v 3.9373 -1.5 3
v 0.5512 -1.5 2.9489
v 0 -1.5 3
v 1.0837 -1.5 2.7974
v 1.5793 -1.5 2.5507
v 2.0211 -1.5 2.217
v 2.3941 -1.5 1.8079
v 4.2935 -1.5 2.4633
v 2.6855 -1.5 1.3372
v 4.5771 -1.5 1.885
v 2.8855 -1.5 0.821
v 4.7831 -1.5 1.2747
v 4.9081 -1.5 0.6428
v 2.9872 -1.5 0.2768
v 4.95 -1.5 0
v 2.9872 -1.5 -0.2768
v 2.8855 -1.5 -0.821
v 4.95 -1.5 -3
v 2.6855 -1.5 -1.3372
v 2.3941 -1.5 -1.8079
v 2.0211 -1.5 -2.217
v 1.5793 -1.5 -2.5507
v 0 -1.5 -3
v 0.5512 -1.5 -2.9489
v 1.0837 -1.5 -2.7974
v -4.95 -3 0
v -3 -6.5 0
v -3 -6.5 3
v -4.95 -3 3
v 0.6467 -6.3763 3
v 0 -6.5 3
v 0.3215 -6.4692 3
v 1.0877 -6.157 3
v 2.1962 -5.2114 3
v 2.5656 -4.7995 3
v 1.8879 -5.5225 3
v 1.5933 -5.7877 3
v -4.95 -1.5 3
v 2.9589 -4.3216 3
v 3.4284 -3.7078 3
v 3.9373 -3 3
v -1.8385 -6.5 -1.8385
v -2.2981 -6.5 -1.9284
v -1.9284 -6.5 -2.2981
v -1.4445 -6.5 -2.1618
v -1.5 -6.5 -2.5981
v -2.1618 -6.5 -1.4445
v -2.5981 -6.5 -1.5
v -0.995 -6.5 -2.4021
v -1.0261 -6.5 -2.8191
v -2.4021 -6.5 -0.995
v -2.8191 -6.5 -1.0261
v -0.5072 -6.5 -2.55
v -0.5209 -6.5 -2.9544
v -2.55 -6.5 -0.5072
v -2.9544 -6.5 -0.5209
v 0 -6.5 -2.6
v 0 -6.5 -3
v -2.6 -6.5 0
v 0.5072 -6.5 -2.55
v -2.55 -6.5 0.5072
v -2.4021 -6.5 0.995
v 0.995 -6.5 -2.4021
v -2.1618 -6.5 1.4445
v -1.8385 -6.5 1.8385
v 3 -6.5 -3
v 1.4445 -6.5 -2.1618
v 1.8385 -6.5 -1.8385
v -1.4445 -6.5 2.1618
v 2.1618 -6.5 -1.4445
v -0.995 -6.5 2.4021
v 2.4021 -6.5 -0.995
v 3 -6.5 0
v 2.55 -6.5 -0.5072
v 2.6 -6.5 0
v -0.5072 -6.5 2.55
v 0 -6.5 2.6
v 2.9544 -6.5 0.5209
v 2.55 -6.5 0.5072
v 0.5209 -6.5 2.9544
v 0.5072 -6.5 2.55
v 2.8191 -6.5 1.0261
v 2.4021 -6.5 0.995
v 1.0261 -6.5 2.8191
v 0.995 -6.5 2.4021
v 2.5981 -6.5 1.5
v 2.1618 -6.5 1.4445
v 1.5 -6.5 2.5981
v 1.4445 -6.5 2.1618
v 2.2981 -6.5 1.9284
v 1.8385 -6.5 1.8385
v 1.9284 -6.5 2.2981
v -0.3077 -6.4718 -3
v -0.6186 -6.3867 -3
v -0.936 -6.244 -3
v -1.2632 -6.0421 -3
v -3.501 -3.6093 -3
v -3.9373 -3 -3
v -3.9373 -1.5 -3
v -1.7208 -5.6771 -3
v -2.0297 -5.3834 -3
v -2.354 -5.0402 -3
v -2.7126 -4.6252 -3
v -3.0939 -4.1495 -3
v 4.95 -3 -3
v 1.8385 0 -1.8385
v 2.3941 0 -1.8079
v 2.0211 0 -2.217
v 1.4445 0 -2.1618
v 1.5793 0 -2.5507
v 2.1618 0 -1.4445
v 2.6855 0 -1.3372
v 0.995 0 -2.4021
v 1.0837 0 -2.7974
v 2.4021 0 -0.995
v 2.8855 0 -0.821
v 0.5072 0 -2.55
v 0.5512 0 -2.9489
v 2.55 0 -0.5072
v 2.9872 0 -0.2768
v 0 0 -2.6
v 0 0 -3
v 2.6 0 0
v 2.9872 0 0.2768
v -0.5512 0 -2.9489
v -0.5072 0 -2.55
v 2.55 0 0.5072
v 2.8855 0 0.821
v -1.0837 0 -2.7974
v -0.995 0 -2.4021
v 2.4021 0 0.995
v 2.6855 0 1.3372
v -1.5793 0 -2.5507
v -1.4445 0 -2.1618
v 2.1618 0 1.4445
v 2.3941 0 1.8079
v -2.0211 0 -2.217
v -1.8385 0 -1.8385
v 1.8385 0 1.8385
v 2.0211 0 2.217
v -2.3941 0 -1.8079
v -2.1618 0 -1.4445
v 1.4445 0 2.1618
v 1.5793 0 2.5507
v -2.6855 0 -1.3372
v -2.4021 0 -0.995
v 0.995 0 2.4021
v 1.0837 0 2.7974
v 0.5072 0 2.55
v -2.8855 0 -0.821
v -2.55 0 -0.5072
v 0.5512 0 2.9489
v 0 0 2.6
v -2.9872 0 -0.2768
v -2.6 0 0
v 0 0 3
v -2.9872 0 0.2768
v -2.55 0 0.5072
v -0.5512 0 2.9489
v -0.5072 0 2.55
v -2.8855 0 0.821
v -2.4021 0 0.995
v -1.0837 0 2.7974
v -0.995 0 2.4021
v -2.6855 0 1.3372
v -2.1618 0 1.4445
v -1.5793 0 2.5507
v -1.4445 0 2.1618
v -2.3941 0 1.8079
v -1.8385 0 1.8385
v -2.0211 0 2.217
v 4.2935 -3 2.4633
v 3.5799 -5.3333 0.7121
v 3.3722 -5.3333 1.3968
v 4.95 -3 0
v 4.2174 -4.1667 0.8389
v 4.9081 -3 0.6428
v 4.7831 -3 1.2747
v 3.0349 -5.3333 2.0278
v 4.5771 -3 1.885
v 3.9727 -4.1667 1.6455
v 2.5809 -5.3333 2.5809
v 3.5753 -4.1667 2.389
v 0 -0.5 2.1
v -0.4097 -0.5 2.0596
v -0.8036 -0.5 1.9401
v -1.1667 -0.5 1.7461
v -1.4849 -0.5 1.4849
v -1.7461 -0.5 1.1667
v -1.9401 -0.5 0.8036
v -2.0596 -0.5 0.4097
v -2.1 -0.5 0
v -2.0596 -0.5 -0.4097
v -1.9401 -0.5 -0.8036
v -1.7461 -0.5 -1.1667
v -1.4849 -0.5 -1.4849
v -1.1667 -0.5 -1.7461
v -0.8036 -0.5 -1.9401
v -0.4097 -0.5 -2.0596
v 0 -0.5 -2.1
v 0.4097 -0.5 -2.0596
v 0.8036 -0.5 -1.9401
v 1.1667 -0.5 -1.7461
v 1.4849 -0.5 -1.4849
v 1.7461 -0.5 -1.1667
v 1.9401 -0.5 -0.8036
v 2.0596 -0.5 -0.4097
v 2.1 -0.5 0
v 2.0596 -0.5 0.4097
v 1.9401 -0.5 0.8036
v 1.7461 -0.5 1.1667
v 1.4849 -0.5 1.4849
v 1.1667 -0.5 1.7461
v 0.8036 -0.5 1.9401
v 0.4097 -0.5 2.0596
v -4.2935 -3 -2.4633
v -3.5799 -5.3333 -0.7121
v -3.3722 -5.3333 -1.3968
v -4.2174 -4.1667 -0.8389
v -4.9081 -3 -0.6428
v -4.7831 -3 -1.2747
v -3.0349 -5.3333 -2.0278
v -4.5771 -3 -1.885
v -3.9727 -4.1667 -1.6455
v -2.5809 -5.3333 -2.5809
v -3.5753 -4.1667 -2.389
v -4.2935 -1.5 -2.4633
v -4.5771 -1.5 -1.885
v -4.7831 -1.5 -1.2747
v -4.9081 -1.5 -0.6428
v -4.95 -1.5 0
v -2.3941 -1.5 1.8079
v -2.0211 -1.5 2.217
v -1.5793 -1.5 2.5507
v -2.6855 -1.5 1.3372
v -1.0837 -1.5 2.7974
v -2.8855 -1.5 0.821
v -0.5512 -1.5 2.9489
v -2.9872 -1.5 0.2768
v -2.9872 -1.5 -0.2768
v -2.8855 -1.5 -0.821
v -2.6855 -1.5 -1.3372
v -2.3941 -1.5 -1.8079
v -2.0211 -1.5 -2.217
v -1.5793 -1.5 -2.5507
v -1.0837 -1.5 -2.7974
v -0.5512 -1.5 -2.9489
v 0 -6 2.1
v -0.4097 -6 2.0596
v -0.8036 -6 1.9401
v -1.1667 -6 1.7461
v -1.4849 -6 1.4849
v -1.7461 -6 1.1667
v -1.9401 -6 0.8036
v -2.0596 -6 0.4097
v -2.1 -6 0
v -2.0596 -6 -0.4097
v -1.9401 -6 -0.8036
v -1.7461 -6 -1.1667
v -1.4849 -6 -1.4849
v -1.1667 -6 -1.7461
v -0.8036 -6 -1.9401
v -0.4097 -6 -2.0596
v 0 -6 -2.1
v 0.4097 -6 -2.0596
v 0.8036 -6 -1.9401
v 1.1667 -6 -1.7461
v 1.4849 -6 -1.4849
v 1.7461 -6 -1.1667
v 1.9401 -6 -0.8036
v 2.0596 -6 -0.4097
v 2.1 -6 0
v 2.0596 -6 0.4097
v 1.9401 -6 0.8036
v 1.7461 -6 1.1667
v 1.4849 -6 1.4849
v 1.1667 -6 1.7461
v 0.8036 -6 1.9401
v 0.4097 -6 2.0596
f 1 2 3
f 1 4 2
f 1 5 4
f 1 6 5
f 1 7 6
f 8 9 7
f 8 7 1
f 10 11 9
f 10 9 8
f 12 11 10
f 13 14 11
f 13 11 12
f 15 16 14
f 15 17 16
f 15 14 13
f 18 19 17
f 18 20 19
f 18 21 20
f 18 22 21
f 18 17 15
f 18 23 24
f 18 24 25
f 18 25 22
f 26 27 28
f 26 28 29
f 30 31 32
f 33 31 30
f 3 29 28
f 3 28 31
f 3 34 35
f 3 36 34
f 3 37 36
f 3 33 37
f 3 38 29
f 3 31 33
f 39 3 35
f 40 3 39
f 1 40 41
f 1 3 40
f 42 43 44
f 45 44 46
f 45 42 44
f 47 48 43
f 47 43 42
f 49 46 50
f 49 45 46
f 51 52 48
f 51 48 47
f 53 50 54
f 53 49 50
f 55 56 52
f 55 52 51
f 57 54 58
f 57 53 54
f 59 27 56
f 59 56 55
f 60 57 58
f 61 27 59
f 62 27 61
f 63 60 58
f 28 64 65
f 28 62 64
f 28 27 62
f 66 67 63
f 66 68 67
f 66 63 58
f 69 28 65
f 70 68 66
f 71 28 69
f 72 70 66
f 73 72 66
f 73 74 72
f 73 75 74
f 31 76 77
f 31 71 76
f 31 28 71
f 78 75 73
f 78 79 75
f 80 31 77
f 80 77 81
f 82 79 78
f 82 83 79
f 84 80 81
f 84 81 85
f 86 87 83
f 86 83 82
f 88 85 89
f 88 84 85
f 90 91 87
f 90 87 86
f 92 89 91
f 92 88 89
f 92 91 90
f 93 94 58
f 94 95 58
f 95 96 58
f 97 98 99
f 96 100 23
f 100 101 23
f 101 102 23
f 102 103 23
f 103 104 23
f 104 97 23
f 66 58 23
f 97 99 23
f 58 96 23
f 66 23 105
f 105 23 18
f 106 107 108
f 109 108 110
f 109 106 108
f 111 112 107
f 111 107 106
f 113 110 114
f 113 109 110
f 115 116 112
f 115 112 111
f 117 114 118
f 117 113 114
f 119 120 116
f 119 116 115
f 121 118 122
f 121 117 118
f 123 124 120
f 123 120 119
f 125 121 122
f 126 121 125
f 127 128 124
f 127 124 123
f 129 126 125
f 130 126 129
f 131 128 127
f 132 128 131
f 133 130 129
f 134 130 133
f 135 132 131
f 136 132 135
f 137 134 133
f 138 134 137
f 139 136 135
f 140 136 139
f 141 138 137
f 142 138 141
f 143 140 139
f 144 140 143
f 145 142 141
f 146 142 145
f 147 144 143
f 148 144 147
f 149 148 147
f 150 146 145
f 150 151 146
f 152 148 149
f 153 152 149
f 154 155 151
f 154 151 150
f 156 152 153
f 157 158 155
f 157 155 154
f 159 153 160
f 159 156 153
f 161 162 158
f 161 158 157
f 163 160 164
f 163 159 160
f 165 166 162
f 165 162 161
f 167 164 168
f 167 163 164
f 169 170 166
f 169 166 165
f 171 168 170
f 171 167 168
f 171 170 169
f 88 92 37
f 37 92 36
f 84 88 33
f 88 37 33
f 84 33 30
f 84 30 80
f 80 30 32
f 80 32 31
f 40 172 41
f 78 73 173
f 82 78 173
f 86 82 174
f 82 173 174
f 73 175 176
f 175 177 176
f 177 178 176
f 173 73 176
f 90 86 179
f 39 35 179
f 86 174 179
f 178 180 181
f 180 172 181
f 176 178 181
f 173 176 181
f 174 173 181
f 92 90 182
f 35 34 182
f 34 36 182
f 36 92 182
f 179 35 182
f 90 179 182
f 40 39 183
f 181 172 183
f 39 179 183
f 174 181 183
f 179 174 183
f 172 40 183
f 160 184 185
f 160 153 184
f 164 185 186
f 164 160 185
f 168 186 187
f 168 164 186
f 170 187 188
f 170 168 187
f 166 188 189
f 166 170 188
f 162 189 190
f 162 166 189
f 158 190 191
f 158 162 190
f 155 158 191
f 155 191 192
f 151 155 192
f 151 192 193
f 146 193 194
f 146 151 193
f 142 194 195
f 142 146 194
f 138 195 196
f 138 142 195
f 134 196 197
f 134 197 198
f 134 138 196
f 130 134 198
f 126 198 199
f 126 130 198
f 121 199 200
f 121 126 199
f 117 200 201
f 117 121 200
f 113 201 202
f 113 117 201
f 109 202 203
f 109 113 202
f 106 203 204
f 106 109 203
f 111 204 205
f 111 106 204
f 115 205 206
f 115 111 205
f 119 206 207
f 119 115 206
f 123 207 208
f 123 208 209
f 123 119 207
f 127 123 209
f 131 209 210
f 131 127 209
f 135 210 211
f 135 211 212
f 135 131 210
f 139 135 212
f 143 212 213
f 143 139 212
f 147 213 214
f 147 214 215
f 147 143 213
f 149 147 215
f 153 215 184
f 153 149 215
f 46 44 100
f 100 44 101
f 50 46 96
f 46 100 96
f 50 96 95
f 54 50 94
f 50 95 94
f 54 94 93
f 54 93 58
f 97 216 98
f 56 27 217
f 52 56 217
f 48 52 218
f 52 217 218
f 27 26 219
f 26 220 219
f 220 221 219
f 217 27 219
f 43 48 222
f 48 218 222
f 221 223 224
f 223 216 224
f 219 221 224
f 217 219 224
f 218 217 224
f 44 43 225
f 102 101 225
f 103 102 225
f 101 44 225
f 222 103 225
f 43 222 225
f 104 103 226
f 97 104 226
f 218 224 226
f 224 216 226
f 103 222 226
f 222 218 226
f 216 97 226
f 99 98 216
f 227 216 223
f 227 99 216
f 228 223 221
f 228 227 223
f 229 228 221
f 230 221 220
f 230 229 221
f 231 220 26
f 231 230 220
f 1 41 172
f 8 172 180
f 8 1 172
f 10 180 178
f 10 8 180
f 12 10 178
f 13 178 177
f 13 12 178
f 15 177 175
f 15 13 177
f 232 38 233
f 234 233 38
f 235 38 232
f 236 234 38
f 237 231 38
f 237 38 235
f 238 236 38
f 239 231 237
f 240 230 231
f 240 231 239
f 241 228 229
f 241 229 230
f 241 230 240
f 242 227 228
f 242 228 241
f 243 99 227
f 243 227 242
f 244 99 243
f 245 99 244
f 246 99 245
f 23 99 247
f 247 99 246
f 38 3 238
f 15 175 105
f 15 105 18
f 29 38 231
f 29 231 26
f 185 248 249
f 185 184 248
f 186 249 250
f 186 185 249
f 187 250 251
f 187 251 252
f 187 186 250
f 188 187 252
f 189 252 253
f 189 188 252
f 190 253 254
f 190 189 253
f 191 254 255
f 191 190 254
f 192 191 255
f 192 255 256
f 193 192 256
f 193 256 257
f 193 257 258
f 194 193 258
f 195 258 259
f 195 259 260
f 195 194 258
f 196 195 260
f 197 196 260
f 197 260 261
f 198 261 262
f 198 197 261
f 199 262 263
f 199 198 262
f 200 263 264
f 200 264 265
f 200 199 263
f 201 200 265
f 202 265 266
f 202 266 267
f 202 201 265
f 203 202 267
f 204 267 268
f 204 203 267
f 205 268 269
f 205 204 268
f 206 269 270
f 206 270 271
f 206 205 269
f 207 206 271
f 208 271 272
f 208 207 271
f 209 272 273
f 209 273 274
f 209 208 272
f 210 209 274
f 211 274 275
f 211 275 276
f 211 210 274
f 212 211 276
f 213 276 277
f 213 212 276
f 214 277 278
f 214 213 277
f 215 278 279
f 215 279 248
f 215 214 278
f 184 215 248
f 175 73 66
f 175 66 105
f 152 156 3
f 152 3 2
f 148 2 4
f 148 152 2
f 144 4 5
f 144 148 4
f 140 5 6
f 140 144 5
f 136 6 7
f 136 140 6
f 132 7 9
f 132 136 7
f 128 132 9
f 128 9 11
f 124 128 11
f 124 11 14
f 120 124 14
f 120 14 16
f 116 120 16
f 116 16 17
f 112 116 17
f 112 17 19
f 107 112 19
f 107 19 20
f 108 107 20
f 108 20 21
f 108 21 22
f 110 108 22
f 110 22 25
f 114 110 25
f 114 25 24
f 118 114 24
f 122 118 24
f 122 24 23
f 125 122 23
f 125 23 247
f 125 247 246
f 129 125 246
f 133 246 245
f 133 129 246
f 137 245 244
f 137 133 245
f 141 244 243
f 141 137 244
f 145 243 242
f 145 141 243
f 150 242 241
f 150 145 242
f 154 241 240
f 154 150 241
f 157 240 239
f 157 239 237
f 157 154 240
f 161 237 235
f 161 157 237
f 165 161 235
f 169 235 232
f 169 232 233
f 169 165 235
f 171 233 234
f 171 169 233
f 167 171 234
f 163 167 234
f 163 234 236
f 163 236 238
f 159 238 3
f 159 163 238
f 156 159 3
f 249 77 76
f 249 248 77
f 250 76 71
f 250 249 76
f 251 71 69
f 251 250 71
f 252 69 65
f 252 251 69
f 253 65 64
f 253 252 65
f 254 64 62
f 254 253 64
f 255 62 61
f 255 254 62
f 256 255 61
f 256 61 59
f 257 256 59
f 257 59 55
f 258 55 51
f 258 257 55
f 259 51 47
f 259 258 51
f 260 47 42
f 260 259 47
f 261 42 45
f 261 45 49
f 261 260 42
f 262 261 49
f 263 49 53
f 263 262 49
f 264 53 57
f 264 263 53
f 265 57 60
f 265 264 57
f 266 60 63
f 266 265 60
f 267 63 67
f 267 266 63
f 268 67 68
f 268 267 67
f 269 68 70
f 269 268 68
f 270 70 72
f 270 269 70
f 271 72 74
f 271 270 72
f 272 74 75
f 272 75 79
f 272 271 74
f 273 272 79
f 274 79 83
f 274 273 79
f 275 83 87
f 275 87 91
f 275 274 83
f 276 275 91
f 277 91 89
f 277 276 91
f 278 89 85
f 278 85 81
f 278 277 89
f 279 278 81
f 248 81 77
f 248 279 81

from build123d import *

# Parameters (mm, degrees)
EXTRUDE_1_DEPTH     = 3
SKETCH_4_OUTSIDE_W  = 14.556
SKETCH_4_OUTSIDE_H  = 10.656
SKETCH_4_OUTSIDE_R  = 3
CUT_EXTRUDE_1_DEPTH = 1.5
CUT_EXTRUDE_2_DEPTH = 6


with BuildPart() as part:
    # Эскиз1 → Бобышка-Вытянуть1 (new body, symmetric)
    with BuildSketch(Plane.XY):
        Polygon((3, 0), (-3, 0), (-3, -1.5), (-4.95, -1.5), (-4.95, -6.5), (4.95, -6.5), (4.95, -1.5), (3, -1.5), align=None)
    extrude(amount=EXTRUDE_1_DEPTH, both=True)

    # Эскиз3 → Отверстие обработанное метчиком M51 (revolve, cut)
    with BuildSketch(Plane(origin=(0, 0, 0), x_dir=(0, 0, 1), z_dir=(1, 0, 0))):
        Polygon((0, 0), (0, 6.5), (2.6, 6.5), (2.1, 6), (2.1, 0.5), (2.6, 0), align=None)
    revolve(axis=Axis((0, 6.35, 0), (0, -1, 0)), mode=Mode.SUBTRACT)

    # Эскиз4 outside → Вырез-Вытянуть1 (cut)
    with BuildSketch(Plane(origin=(0, 0, 0), x_dir=(1, 0, 0), z_dir=(0, 1, 0))):
        Rectangle(SKETCH_4_OUTSIDE_W, SKETCH_4_OUTSIDE_H)
        with Locations(Location((0, 0, 0), (0, 0, 270))):  # turned: the seam where the file's is
            Circle(SKETCH_4_OUTSIDE_R, mode=Mode.SUBTRACT)
    extrude(amount=-CUT_EXTRUDE_1_DEPTH, mode=Mode.SUBTRACT)

    # Эскиз5 → Вырез-Вытянуть2 (cut, through all)
    with BuildSketch(Plane(origin=(0, -1.5, 0), x_dir=(1, 0, 0), z_dir=(0, 1, 0))):
        with BuildLine():
            Line((-4.95, 0), (-4.95, 3))
            Line((-4.95, 3), (-3.937321425, 3))
            ThreePointArc((-3.937321425, 3), (-4.690002188, 1.583154912), (-4.95, 0))
        make_face()
        with BuildLine():
            Line((4.95, 0), (4.95, -3))
            Line((4.95, -3), (3.937321425, -3))
            ThreePointArc((3.937321425, -3), (4.690002188, -1.583154912), (4.95, 0))
        make_face()
    extrude(amount=-CUT_EXTRUDE_2_DEPTH, mode=Mode.SUBTRACT)

    # Вырез-По траектории1: sweep along a path in Эскиз7
    with BuildLine(Plane.XZ.offset(6.5)) as sweep_1_path:
        Line((0, 4.95), (-4.95, 4.95))
        Line((-4.95, 4.95), (-4.95, 0))
        ThreePointArc((-4.95, 0), (-3.500178567, -3.500178567), (0, -4.95))
        Line((0, -4.95), (4.95, -4.95))
        Line((4.95, -4.95), (4.95, 0))
        ThreePointArc((4.95, 0), (3.500178567, 3.500178567), (0, 4.95))
    # Эскиз6 → Вырез-По траектории1 (sweep, cut)
    with BuildSketch(Plane.XY.offset(3)):
        Polygon((-4.95, -3), (-4.95, -6.5), (-3, -6.5), align=None)
    sweep(path=sweep_1_path.line, transition=Transition.RIGHT, mode=Mode.SUBTRACT)


solid = part.part
